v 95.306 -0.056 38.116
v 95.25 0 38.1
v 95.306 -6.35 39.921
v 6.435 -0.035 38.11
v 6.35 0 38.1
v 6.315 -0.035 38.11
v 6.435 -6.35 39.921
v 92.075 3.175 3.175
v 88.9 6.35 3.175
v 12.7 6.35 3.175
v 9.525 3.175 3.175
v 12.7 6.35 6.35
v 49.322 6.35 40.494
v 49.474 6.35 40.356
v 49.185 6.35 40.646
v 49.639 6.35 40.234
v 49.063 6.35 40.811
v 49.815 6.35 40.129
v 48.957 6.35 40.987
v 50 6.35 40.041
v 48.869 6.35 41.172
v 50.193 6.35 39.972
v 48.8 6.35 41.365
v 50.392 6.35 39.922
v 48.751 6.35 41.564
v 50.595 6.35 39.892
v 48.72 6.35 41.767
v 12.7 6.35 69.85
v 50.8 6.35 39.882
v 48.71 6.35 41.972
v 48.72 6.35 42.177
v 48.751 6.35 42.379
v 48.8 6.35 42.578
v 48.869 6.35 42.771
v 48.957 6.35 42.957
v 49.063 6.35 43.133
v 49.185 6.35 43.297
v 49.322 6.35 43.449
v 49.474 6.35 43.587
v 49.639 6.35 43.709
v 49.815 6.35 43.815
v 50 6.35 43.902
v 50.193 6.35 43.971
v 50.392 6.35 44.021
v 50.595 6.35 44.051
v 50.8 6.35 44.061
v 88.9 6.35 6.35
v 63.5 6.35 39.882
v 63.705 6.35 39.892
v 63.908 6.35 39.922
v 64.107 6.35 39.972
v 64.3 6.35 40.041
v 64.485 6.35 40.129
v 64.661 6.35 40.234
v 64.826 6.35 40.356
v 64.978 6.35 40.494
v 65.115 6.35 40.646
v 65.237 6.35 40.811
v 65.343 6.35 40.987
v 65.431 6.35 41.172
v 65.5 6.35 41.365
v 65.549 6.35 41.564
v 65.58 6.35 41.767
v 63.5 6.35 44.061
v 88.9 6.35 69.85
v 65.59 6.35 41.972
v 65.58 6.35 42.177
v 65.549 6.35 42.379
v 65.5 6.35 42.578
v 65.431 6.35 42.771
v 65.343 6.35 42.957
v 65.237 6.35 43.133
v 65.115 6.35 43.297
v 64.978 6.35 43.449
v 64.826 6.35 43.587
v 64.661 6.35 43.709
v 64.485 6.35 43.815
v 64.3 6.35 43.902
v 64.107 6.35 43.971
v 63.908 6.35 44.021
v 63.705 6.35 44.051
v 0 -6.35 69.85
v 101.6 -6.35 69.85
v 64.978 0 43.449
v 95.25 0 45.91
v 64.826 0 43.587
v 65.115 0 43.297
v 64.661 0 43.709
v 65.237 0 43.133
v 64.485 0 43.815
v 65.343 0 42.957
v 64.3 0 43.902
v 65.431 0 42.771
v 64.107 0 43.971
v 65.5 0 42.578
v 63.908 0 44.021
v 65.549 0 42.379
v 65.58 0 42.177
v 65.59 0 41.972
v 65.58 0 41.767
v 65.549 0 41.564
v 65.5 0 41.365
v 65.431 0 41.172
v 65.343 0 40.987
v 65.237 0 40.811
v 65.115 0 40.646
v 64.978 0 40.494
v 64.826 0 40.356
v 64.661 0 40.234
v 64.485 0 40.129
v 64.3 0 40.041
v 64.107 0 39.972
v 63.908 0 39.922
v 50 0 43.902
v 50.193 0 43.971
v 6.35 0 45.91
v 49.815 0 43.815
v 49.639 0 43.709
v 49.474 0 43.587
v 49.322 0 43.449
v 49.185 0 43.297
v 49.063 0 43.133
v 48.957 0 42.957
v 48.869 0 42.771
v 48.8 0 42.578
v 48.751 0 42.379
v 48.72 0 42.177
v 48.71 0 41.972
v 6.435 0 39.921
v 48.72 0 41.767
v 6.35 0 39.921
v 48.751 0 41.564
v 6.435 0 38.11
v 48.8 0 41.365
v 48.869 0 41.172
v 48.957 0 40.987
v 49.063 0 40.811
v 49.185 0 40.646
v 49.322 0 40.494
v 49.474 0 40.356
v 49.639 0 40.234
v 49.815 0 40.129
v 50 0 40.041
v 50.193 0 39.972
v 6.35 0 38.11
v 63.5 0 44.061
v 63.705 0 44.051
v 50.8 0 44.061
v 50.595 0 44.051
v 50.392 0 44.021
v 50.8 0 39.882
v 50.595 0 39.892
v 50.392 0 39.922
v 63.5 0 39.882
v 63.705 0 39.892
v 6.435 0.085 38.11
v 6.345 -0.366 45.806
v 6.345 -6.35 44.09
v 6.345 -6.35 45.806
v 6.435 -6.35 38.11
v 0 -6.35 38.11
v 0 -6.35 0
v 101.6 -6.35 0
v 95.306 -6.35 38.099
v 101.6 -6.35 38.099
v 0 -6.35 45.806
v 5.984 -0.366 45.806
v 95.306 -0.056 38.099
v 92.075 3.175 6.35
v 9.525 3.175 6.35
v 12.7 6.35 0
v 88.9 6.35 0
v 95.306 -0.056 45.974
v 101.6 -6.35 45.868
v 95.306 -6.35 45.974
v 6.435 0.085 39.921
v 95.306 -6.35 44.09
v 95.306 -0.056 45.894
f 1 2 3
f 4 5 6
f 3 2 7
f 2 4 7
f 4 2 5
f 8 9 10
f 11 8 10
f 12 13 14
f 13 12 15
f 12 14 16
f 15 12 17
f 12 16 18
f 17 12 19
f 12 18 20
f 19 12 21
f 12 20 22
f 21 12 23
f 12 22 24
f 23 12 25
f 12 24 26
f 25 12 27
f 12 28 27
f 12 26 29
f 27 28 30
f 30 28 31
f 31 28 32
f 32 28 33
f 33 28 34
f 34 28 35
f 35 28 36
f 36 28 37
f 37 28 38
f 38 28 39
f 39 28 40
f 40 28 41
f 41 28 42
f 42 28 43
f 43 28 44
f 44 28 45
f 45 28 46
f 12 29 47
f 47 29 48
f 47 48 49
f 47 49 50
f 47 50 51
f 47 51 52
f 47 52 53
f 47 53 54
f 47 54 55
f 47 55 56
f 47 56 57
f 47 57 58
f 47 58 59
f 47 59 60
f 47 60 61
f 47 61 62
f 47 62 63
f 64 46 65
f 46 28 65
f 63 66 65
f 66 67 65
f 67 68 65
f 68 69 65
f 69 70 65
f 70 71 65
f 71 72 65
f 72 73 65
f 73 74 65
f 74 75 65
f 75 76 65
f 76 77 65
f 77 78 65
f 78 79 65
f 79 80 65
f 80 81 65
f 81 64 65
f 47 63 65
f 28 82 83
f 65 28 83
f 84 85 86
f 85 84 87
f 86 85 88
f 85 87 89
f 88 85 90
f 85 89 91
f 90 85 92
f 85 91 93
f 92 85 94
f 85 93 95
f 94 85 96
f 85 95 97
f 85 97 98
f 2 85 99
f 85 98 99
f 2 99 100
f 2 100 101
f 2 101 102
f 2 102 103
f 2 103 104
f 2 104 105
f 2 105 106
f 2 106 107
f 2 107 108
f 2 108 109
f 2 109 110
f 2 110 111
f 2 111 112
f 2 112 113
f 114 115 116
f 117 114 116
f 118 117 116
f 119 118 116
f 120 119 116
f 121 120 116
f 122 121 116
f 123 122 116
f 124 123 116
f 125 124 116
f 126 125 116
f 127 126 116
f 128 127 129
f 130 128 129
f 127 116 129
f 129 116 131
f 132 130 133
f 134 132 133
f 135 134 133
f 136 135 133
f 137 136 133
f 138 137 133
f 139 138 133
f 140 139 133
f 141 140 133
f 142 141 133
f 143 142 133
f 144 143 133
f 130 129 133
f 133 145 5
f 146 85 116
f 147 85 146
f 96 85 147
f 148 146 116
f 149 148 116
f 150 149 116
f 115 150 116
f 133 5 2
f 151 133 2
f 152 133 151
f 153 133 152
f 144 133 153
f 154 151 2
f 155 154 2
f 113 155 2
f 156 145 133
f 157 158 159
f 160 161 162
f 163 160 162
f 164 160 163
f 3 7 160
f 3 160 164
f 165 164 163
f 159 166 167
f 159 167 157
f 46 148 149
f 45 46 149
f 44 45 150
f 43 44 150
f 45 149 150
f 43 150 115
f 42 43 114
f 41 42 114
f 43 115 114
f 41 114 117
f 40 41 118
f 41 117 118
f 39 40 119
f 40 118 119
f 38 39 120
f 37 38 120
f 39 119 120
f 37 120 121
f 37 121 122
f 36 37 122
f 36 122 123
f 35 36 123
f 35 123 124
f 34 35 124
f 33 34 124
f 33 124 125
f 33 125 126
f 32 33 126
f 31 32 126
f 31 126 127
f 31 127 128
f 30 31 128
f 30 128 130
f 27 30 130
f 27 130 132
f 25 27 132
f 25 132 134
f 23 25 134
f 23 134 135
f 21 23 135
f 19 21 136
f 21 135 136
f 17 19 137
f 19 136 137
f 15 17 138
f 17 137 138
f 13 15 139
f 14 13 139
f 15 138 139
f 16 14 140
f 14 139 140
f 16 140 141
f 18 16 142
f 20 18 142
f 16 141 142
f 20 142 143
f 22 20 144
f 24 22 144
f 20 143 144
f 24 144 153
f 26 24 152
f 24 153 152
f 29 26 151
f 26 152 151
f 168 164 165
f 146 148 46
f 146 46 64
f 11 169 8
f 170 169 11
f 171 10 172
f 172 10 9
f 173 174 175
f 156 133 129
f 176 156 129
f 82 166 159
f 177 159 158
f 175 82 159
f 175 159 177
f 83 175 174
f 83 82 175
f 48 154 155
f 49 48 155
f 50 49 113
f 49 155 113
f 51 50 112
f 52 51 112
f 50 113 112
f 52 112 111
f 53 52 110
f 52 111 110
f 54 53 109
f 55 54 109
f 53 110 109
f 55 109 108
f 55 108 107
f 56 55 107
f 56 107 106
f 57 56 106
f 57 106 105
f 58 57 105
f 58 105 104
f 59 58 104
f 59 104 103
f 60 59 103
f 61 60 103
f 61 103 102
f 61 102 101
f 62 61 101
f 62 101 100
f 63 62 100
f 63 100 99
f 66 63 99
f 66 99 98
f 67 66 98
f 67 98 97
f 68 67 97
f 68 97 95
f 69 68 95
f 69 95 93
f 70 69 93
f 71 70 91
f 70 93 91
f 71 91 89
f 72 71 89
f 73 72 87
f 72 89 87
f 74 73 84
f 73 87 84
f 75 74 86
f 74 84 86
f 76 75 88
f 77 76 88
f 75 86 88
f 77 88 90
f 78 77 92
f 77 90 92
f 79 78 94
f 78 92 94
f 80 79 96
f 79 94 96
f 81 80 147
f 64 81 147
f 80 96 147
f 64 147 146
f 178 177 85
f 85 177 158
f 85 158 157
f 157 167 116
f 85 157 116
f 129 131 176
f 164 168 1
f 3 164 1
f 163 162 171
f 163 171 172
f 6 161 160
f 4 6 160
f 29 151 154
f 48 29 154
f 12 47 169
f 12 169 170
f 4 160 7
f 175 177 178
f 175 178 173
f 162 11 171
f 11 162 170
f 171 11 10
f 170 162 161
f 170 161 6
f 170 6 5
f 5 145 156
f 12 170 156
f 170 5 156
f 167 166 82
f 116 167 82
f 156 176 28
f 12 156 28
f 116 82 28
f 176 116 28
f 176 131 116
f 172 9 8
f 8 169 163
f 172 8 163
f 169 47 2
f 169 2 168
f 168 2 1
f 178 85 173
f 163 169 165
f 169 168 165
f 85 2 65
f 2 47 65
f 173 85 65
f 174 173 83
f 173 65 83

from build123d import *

# Parameters (mm, degrees)
F1_DEPTH  = 6.35
F3_DEPTH  = 279.4
F4_W      = 101.6
F4_H      = 3.175
F5_DEPTH  = 3.175
F6_W      = 12.7
F6_H      = 4.1792877018
F7_DEPTH  = 25.4
F8_W      = 101.6
F8_H      = 6.35
F9_DEPTH  = 25.4
F11_DEPTH = 69.851
F12_W     = 6.2937450767
F12_H     = 5.9905603992
F13_DEPTH = 6.35
F14_W     = 6.4354827628
F14_H     = 1.8108228737
F15_DEPTH = 25.4
F16_W     = 6.3454108313
F16_H     = 1.71593274
F17_DEPTH = 25.4


# Not quite as in the source:
# - a feature names something its author has since deleted; it is built from what else it names


with BuildPart() as f1:
    # F0 (on Front) → F1 (new body, symmetric)
    with BuildSketch(Plane.XZ):
        Polygon((0, 38.1), (0, 0), (101.6, 0), (101.6, 76.2), (0, 76.2), align=None)
    extrude(amount=F1_DEPTH, both=True)

    # F2 (on face) → F3 (cut)
    with BuildSketch(Plane(origin=(0, 0, 0), x_dir=(0, -1, 0), z_dir=(-1, 0, 0))):
        Polygon((0, 45.9105), (0, 38.1), (6.35, 39.9208331996), (6.35, 44.0896668004), align=None)
    extrude(amount=-F3_DEPTH, mode=Mode.SUBTRACT)

    # F4 (on face) → F5 (cut)
    with BuildSketch(Plane(origin=(0, 6.35, 0), x_dir=(-1, 0, 0), z_dir=(0, 1, 0))):
        with Locations((-50.8, 4.7625)):
            Rectangle(F4_W, F4_H)
    extrude(amount=-F5_DEPTH, mode=Mode.SUBTRACT)

    # F6 (on face) → F7 (cut)
    with BuildSketch(Plane.XZ):
        with BuildLine():
            Line((50.8, 39.8820452392), (50.8, 44.0613329411))
            ThreePointArc((50.8, 44.0613329411), (48.7103561491, 41.9716890901), (50.8, 39.8820452392))
        make_face()
        with Locations((57.15, 41.9716890901)):
            Rectangle(F6_W, F6_H)
        with BuildLine():
            ThreePointArc((63.5, 39.8820452392), (65.5896438509, 41.9716890901), (63.5, 44.0613329411))
            Line((63.5, 44.0613329411), (63.5, 39.8820452392))
        make_face()
    extrude(amount=-F7_DEPTH, mode=Mode.SUBTRACT)

    # F8 (on face) → F9 (cut)
    with BuildSketch(Plane.XZ.offset(6.35)):
        with Locations((50.8, 73.025)):
            Rectangle(F8_W, F8_H)
    extrude(amount=-F9_DEPTH, mode=Mode.SUBTRACT)

    # F10 (on face) → F11 (cut, through all)
    with BuildSketch(Plane.XY.offset(69.85)):
        Polygon((0, 6.35), (0, -6.35), (12.7, 6.35), align=None)
        Polygon((88.9, 6.35), (101.6, -6.35), (101.6, 6.35), align=None)
    extrude(amount=-F11_DEPTH, mode=Mode.SUBTRACT)

    # F12 (on face) → F13 (cut)
    with BuildSketch(Plane.XZ.offset(6.35)):
        with Locations((98.4531274617, 41.0943866008)):
            Rectangle(F12_W, F12_H)
        Polygon((101.6, 45.8681471646), (95.3062549233, 45.9736101329), (95.3062549233, 44.0896668004), (101.6, 44.0896668004), align=None)
    extrude(amount=-F13_DEPTH, mode=Mode.SUBTRACT)

    # F14 (on face) → F15 (cut)
    with BuildSketch(Plane.XZ.offset(6.35)):
        with Locations((3.2177413814, 39.0154217627)):
            Rectangle(F14_W, F14_H)
    extrude(amount=-F15_DEPTH, mode=Mode.SUBTRACT)

    # F16 (on face) → F17 (cut)
    with BuildSketch(Plane.XZ.offset(6.35)):
        with Locations((3.1727054156, 44.9476331705)):
            Rectangle(F16_W, F16_H)
    extrude(amount=-F17_DEPTH, mode=Mode.SUBTRACT)


solid = f1.part
